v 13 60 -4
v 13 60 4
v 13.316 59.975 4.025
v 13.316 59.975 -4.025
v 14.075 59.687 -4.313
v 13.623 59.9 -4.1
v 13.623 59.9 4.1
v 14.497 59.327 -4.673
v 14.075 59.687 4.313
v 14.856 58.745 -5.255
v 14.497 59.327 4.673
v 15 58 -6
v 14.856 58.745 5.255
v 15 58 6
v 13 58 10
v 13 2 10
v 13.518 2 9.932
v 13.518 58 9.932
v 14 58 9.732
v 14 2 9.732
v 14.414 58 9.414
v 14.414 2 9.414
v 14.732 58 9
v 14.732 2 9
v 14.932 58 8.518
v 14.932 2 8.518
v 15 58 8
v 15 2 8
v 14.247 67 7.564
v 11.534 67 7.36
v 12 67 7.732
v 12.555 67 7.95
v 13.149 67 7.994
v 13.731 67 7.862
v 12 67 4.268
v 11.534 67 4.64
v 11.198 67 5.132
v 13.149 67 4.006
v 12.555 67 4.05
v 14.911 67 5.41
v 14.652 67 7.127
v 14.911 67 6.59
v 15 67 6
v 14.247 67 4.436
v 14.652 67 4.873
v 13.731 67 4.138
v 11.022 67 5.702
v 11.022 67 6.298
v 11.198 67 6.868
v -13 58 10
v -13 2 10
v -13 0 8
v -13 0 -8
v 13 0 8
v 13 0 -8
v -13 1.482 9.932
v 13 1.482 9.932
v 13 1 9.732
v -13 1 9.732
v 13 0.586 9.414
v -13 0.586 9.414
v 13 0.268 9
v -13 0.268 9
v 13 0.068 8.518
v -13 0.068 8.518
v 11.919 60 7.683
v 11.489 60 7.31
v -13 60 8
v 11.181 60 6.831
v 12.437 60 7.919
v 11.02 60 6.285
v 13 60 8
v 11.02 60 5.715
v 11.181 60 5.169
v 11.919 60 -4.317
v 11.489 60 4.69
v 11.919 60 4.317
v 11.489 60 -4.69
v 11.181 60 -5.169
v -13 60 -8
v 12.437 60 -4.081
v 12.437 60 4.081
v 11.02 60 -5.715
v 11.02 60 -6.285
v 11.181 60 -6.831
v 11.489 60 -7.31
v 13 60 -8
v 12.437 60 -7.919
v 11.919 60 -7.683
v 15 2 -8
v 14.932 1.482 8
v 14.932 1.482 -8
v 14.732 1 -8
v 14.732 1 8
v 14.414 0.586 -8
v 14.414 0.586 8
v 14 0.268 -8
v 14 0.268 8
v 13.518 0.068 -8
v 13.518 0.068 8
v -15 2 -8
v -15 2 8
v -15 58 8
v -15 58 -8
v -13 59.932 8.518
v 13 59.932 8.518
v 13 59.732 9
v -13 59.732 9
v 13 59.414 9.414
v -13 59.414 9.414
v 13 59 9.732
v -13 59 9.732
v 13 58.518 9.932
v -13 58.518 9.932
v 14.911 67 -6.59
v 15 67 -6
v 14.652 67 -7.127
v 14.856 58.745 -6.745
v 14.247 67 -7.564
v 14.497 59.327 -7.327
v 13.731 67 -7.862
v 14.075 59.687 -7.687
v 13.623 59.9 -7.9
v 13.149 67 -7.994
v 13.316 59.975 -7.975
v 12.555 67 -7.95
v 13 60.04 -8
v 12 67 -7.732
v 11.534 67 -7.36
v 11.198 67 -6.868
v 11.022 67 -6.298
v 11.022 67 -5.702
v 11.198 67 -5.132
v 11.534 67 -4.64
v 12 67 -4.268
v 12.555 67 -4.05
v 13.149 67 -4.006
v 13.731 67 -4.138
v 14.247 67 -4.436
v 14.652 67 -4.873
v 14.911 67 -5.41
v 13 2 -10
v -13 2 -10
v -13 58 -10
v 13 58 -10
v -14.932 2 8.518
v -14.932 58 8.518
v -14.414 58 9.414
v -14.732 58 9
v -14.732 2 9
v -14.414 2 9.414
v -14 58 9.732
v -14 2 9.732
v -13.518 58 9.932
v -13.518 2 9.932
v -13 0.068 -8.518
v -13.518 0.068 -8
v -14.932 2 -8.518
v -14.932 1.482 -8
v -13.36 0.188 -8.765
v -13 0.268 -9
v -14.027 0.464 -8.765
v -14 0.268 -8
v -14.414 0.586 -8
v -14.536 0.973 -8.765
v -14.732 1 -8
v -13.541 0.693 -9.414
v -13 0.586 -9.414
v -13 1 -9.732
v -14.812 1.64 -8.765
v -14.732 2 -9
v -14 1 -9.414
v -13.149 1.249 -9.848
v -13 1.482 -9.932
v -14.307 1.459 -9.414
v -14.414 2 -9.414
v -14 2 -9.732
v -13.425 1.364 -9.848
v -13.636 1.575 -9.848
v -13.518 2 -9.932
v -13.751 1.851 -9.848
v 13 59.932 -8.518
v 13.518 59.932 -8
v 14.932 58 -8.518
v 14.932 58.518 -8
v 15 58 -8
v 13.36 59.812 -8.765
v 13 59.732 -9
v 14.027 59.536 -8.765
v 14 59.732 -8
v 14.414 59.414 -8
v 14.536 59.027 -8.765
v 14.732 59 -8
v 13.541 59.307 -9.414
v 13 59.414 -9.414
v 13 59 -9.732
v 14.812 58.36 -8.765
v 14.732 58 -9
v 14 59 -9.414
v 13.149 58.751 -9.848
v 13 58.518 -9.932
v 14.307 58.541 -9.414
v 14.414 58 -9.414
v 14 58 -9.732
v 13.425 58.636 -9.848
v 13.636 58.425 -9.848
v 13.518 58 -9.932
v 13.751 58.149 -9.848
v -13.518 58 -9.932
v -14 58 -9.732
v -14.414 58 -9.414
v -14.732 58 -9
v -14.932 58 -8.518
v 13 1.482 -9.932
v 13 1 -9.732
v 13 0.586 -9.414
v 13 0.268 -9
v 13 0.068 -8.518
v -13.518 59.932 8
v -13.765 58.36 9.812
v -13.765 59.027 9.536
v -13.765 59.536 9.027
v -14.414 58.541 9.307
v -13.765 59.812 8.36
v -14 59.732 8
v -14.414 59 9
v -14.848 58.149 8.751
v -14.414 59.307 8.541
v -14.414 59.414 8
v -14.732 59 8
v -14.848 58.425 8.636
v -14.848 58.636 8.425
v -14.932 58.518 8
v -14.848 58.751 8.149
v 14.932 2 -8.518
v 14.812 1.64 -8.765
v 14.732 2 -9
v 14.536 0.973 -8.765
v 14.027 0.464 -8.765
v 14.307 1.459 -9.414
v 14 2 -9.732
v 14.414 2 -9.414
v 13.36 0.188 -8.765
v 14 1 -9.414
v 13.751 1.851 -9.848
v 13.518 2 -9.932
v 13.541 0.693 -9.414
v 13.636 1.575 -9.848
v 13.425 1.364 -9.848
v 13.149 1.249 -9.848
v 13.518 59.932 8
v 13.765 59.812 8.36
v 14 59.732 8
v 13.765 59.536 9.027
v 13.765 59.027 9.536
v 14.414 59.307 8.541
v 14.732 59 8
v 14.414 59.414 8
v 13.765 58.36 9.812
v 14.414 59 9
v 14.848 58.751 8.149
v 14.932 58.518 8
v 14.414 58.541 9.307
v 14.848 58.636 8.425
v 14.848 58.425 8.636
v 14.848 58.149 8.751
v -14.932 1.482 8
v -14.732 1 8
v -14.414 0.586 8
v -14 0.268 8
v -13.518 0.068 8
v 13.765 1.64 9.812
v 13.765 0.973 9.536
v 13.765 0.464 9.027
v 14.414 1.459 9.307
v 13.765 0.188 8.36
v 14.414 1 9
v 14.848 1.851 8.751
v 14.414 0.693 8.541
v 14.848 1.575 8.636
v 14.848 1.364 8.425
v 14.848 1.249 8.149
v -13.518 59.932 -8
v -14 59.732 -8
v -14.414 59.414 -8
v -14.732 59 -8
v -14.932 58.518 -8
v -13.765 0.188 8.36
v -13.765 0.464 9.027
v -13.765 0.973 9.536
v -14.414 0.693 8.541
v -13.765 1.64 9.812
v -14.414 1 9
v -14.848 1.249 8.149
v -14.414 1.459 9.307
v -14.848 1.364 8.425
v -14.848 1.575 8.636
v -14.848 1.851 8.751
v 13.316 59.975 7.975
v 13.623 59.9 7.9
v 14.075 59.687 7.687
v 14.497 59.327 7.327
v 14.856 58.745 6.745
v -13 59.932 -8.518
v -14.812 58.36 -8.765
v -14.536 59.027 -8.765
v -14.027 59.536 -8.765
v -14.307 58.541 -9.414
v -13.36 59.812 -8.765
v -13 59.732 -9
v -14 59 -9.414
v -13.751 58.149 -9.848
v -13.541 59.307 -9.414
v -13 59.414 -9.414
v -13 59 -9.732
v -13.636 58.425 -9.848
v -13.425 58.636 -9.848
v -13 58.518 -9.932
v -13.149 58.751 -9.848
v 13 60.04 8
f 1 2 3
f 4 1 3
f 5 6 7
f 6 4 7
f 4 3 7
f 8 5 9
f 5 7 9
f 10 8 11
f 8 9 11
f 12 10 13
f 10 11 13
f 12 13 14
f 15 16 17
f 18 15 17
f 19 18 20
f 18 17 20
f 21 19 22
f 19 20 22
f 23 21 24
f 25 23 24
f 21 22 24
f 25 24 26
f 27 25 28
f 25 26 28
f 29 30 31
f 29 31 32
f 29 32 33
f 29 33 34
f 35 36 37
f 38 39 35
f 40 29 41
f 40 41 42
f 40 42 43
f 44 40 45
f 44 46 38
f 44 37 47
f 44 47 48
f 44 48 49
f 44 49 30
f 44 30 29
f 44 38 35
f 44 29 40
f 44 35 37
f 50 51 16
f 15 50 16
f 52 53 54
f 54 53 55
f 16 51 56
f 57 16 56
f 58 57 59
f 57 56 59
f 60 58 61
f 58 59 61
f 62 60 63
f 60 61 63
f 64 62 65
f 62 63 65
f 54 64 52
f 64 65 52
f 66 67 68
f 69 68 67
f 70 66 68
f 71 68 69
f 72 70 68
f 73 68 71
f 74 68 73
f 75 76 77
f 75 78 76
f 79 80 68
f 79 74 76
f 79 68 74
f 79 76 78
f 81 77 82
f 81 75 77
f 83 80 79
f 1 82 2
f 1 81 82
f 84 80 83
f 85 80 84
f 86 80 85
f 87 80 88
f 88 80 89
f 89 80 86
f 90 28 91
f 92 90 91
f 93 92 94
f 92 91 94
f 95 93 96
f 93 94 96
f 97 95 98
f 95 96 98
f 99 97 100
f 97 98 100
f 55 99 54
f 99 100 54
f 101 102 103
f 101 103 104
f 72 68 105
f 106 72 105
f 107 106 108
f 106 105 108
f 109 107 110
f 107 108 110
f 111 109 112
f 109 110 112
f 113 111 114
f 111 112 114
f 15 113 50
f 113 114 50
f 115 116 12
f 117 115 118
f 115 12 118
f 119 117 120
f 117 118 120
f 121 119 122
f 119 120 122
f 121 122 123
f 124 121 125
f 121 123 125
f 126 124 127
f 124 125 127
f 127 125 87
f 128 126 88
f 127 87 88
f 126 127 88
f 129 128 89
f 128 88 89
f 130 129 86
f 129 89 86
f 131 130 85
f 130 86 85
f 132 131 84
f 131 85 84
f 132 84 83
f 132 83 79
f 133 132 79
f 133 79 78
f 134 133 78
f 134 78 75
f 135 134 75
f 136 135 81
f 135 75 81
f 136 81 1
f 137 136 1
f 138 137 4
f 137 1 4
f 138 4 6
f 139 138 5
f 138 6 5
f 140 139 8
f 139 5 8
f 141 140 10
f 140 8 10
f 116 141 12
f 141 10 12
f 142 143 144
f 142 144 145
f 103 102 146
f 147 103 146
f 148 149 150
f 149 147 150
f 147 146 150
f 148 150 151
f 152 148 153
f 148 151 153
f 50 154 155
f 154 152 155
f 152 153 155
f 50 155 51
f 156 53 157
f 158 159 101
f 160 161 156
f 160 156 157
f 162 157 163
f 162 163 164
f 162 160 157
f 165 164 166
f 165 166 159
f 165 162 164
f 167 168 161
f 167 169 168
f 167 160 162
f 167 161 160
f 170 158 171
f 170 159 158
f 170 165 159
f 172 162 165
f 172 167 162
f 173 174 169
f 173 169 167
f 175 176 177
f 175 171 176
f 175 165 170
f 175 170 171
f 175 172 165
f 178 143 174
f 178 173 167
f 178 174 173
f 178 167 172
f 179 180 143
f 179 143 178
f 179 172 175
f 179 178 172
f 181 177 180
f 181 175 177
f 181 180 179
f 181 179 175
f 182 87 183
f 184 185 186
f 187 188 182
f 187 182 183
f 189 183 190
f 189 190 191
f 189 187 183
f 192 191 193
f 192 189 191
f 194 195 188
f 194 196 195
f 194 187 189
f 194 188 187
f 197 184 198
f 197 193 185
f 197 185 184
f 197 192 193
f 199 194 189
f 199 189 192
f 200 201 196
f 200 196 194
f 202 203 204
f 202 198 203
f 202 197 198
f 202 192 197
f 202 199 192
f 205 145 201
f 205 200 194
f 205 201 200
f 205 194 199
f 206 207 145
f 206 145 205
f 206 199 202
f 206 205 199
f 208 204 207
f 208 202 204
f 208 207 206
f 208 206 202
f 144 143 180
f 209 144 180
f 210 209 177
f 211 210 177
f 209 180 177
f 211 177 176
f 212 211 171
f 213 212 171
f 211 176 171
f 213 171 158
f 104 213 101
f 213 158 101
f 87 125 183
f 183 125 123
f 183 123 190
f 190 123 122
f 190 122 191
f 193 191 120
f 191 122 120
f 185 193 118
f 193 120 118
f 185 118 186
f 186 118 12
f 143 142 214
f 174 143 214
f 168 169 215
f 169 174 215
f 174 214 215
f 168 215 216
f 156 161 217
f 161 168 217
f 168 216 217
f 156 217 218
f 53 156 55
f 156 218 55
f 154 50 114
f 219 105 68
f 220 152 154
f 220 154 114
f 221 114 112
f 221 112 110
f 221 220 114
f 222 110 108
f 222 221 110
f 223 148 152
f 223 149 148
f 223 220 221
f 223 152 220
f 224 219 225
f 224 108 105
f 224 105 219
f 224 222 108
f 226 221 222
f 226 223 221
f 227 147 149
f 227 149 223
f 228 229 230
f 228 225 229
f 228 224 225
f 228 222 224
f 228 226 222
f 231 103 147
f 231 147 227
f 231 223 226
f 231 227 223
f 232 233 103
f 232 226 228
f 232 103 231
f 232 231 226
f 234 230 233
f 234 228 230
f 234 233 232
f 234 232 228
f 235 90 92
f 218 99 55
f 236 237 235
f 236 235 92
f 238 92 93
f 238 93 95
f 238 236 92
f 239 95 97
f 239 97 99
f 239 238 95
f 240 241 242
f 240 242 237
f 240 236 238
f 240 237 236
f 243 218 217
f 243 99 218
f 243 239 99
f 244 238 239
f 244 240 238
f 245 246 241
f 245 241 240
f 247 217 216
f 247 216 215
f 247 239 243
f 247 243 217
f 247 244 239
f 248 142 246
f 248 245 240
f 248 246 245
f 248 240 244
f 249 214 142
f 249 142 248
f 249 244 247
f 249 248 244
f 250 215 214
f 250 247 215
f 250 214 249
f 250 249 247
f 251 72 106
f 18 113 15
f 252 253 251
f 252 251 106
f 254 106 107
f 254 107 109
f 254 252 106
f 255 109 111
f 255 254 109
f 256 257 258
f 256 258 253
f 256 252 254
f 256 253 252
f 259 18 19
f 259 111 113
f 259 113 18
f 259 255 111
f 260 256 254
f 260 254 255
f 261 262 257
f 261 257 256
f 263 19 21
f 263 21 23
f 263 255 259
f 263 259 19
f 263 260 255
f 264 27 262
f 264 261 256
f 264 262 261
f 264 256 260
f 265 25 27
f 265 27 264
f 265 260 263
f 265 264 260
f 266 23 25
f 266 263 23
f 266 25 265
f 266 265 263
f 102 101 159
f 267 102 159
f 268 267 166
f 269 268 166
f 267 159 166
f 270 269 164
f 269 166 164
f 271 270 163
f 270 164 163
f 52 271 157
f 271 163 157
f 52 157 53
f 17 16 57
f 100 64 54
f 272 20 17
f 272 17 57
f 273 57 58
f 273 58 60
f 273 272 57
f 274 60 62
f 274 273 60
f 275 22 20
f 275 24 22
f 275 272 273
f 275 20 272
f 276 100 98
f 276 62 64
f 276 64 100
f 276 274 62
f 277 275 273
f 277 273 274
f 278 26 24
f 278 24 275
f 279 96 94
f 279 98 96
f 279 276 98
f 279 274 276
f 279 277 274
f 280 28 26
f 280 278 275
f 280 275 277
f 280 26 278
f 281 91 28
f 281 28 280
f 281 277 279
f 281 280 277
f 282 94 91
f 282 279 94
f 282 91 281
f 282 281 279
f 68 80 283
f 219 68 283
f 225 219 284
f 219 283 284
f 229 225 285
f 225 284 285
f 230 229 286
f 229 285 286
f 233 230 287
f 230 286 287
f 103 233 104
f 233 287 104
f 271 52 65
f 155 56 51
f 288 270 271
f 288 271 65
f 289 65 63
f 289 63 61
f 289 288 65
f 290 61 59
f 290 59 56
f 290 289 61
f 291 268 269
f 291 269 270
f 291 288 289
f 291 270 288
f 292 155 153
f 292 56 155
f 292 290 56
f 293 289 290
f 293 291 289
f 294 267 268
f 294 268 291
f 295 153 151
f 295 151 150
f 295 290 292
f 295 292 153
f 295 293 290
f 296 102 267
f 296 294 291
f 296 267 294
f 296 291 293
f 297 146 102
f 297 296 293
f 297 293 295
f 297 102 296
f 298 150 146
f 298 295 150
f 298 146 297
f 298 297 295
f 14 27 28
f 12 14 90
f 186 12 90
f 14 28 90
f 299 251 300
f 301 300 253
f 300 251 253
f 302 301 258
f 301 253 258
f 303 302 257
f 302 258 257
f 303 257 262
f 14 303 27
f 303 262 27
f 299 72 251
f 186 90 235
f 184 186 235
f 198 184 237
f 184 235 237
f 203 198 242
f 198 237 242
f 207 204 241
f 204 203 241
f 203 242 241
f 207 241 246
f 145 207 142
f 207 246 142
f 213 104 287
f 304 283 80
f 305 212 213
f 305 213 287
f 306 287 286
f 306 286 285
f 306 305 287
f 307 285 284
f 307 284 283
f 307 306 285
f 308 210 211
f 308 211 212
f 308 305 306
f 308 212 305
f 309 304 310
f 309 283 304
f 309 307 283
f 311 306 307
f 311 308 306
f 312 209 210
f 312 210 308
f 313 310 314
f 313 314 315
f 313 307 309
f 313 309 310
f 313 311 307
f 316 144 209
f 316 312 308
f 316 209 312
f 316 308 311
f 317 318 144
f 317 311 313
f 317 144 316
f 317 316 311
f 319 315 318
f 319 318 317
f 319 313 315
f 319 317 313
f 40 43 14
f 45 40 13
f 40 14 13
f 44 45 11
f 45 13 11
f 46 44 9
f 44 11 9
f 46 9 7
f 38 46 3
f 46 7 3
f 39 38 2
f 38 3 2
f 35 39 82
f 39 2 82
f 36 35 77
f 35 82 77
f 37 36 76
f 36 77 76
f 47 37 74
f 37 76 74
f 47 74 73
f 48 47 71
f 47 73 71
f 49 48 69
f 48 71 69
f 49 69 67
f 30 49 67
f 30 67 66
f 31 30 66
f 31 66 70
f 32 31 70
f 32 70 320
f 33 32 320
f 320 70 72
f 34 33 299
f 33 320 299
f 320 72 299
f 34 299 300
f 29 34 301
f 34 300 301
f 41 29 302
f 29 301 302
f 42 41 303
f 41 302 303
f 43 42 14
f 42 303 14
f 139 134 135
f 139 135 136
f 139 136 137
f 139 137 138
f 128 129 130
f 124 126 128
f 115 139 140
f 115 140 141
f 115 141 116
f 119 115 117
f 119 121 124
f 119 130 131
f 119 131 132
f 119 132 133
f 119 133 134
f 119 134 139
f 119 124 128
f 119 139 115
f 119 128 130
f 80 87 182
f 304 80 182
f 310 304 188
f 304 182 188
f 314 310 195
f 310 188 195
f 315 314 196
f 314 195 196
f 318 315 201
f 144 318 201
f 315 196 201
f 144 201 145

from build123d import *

# Parameters (mm, degrees)
SKETCH1_W           = 30
SKETCH1_H           = 20
BOSS_EXTRUDE1_DEPTH = 60
SKETCH2_R           = 2
BOSS_EXTRUDE2_DEPTH = 7
FILLET1_R           = 2


with BuildPart() as part:
    # Sketch1 → Boss-Extrude1 (new body)
    with BuildSketch(Plane(origin=(0, 0, 0), x_dir=(1, 0, 0), z_dir=(0, 1, 0))):
        Rectangle(SKETCH1_W, SKETCH1_H)
    extrude(amount=BOSS_EXTRUDE1_DEPTH)

    # Sketch2 → Boss-Extrude2 (add)
    with BuildSketch(Plane(origin=(0, 60, 0), x_dir=(1, 0, 0), z_dir=(0, 1, 0))):
        with Locations((13, 6)):
            Circle(SKETCH2_R)
        with Locations((13, -6)):
            Circle(SKETCH2_R)
    extrude(amount=BOSS_EXTRUDE2_DEPTH)

    # Fillet1
    # the kernel refuses this fillet: 2 mm, written as the material it takes off along each edge
    with BuildSketch(Plane(origin=(13, 58, 8), x_dir=(0, 1, 0), z_dir=(1, 0, 0))) as fillet1_piece_1_section:
        Polygon((0, 0), (FILLET1_R * 1.02, 0), (FILLET1_R * 1.02, FILLET1_R * 1.02), (0, FILLET1_R * 1.02), align=None)
    fillet1_piece_1 = extrude(amount=FILLET1_R * 1.02, mode=Mode.PRIVATE)
    fillet1_piece_1 = fillet1_piece_1 - Plane(origin=(13, 58, 8), x_dir=(0, -0.7071067811865475, -0.7071067811865475), z_dir=(1, 0, 0)) * Sphere(FILLET1_R, mode=Mode.PRIVATE)
    add(fillet1_piece_1, mode=Mode.SUBTRACT)
    with BuildSketch(Plane(origin=(13, 58, -8), x_dir=(1, 0, 0), z_dir=(0, 0, -1))) as fillet1_piece_2_section:
        Polygon((0, 0), (FILLET1_R * 1.02, 0), (FILLET1_R * 1.02, -FILLET1_R * 1.02), (0, -FILLET1_R * 1.02), align=None)
    fillet1_piece_2 = extrude(amount=FILLET1_R * 1.02, mode=Mode.PRIVATE)
    fillet1_piece_2 = fillet1_piece_2 - Plane(origin=(13, 58, -8), x_dir=(-0.7071067811865475, -0.7071067811865475, 0), z_dir=(0, 0, -1)) * Sphere(FILLET1_R, mode=Mode.PRIVATE)
    add(fillet1_piece_2, mode=Mode.SUBTRACT)
    with BuildSketch(Plane(origin=(-13, 58, -8), x_dir=(-1, 0, 0), z_dir=(0, 0, -1))) as fillet1_piece_3_section:
        Polygon((0, 0), (FILLET1_R * 1.02, 0), (FILLET1_R * 1.02, FILLET1_R * 1.02), (0, FILLET1_R * 1.02), align=None)
    fillet1_piece_3 = extrude(amount=FILLET1_R * 1.02, mode=Mode.PRIVATE)
    fillet1_piece_3 = fillet1_piece_3 - Plane(origin=(-13, 58, -8), x_dir=(0.7071067811865475, -0.7071067811865475, 0), z_dir=(0, 0, -1)) * Sphere(FILLET1_R, mode=Mode.PRIVATE)
    add(fillet1_piece_3, mode=Mode.SUBTRACT)
    with BuildSketch(Plane(origin=(-13, 58, 8), x_dir=(0, 1, 0), z_dir=(-1, 0, 0))) as fillet1_piece_4_section:
        Polygon((0, 0), (FILLET1_R * 1.02, 0), (FILLET1_R * 1.02, -FILLET1_R * 1.02), (0, -FILLET1_R * 1.02), align=None)
    fillet1_piece_4 = extrude(amount=FILLET1_R * 1.02, mode=Mode.PRIVATE)
    fillet1_piece_4 = fillet1_piece_4 - Plane(origin=(-13, 58, 8), x_dir=(0, -0.7071067811865475, -0.7071067811865475), z_dir=(-1, 0, 0)) * Sphere(FILLET1_R, mode=Mode.PRIVATE)
    add(fillet1_piece_4, mode=Mode.SUBTRACT)
    with BuildSketch(Plane(origin=(13, 2, -8), x_dir=(1, 0, 0), z_dir=(0, 0, -1))) as fillet1_piece_5_section:
        Polygon((0, 0), (FILLET1_R * 1.02, 0), (FILLET1_R * 1.02, FILLET1_R * 1.02), (0, FILLET1_R * 1.02), align=None)
    fillet1_piece_5 = extrude(amount=FILLET1_R * 1.02, mode=Mode.PRIVATE)
    fillet1_piece_5 = fillet1_piece_5 - Plane(origin=(13, 2, -8), x_dir=(-0.7071067811865475, 0.7071067811865475, 0), z_dir=(0, 0, -1)) * Sphere(FILLET1_R, mode=Mode.PRIVATE)
    add(fillet1_piece_5, mode=Mode.SUBTRACT)
    with BuildSketch(Plane(origin=(-13, 2, -8), x_dir=(-1, 0, 0), z_dir=(0, 0, -1))) as fillet1_piece_6_section:
        Polygon((0, 0), (FILLET1_R * 1.02, 0), (FILLET1_R * 1.02, -FILLET1_R * 1.02), (0, -FILLET1_R * 1.02), align=None)
    fillet1_piece_6 = extrude(amount=FILLET1_R * 1.02, mode=Mode.PRIVATE)
    fillet1_piece_6 = fillet1_piece_6 - Plane(origin=(-13, 2, -8), x_dir=(0.7071067811865475, 0.7071067811865475, 0), z_dir=(0, 0, -1)) * Sphere(FILLET1_R, mode=Mode.PRIVATE)
    add(fillet1_piece_6, mode=Mode.SUBTRACT)
    with BuildSketch(Plane(origin=(13, 2, 8), x_dir=(0, -1, 0), z_dir=(1, 0, 0))) as fillet1_piece_7_section:
        Polygon((0, 0), (FILLET1_R * 1.02, 0), (FILLET1_R * 1.02, -FILLET1_R * 1.02), (0, -FILLET1_R * 1.02), align=None)
    fillet1_piece_7 = extrude(amount=FILLET1_R * 1.02, mode=Mode.PRIVATE)
    fillet1_piece_7 = fillet1_piece_7 - Plane(origin=(13, 2, 8), x_dir=(0, 0.7071067811865475, -0.7071067811865475), z_dir=(1, 0, 0)) * Sphere(FILLET1_R, mode=Mode.PRIVATE)
    add(fillet1_piece_7, mode=Mode.SUBTRACT)
    with BuildSketch(Plane(origin=(-13, 2, 8), x_dir=(0, -1, 0), z_dir=(-1, 0, 0))) as fillet1_piece_8_section:
        Polygon((0, 0), (FILLET1_R * 1.02, 0), (FILLET1_R * 1.02, FILLET1_R * 1.02), (0, FILLET1_R * 1.02), align=None)
    fillet1_piece_8 = extrude(amount=FILLET1_R * 1.02, mode=Mode.PRIVATE)
    fillet1_piece_8 = fillet1_piece_8 - Plane(origin=(-13, 2, 8), x_dir=(0, 0.7071067811865475, -0.7071067811865475), z_dir=(-1, 0, 0)) * Sphere(FILLET1_R, mode=Mode.PRIVATE)
    add(fillet1_piece_8, mode=Mode.SUBTRACT)
    with BuildSketch(Plane(origin=(15, 60, 8), x_dir=(0, -1, 0), z_dir=(0, 0, -1))) as fillet1_piece_9_section:
        with BuildLine():
            CenterArc((FILLET1_R, FILLET1_R), FILLET1_R, 180, 90)
            Line((0, FILLET1_R), (0, 0))
            Line((0, 0), (FILLET1_R, 0))
        make_face()
    fillet1_piece_9 = extrude(amount=2, mode=Mode.PRIVATE)
    fillet1_piece_9 = fillet1_piece_9 - Plane(origin=(13, 59.42884434, 6), x_dir=(1, 0, 0), z_dir=(0, -1, 0)) * Cylinder(2, 12, mode=Mode.PRIVATE)
    add(fillet1_piece_9, mode=Mode.SUBTRACT)
    with BuildSketch(Plane(origin=(15, 60, -6), x_dir=(0, -1, 0), z_dir=(0, 0, -1))) as fillet1_piece_10_section:
        with BuildLine():
            CenterArc((FILLET1_R, FILLET1_R), FILLET1_R, 180, 90)
            Line((0, FILLET1_R), (0, 0))
            Line((0, 0), (FILLET1_R, 0))
        make_face()
    fillet1_piece_10 = extrude(amount=2, mode=Mode.PRIVATE)
    fillet1_piece_10 = fillet1_piece_10 - Plane(origin=(13, 59.42884434, -6), x_dir=(1, 0, 0), z_dir=(0, -1, 0)) * Cylinder(2, 13, mode=Mode.PRIVATE)
    add(fillet1_piece_10, mode=Mode.SUBTRACT)
    with BuildSketch(Plane(origin=(13, 60, -10), x_dir=(0, -1, 0), z_dir=(-1, 0, 0)), Plane(origin=(-13, 0, 10), x_dir=(0, 0, -1), z_dir=(1, 0, 0))) as fillet1_piece_11:
        with BuildLine():
            CenterArc((FILLET1_R, FILLET1_R), FILLET1_R, 180, 90)
            Line((0, FILLET1_R), (0, 0))
            Line((0, 0), (FILLET1_R, 0))
        make_face()
    extrude(amount=26, mode=Mode.SUBTRACT)
    with BuildSketch(Plane(origin=(15, 60, 6), x_dir=(0, -1, 0), z_dir=(0, 0, -1))) as fillet1_piece_12_section:
        with BuildLine():
            CenterArc((FILLET1_R, FILLET1_R), FILLET1_R, 180, 90)
            Line((0, FILLET1_R), (0, 0))
            Line((0, 0), (FILLET1_R, 0))
        make_face()
    fillet1_piece_12 = extrude(amount=12, mode=Mode.PRIVATE)
    fillet1_piece_12 = fillet1_piece_12 - Plane(origin=(13, 59.530547013, 6), x_dir=(1, 0, 0), z_dir=(0, -1, 0)) * Cylinder(2, 32, mode=Mode.PRIVATE)
    fillet1_piece_12 = fillet1_piece_12 - Plane(origin=(13, 59.530547013, -6), x_dir=(1, 0, 0), z_dir=(0, -1, 0)) * Cylinder(2, 32, mode=Mode.PRIVATE)
    add(fillet1_piece_12, mode=Mode.SUBTRACT)
    with BuildSketch(Plane(origin=(-15, 60, -8), x_dir=(0, -1, 0), z_dir=(0, 0, 1))) as fillet1_piece_13:
        with BuildLine():
            CenterArc((FILLET1_R, FILLET1_R), FILLET1_R, 180, 90)
            Line((0, FILLET1_R), (0, 0))
            Line((0, 0), (FILLET1_R, 0))
        make_face()
    extrude(amount=16, mode=Mode.SUBTRACT)
    with BuildSketch(Plane(origin=(13, 0, -10), x_dir=(0, 1, 0), z_dir=(-1, 0, 0)), Plane(origin=(-13, 60, 10), x_dir=(0, 0, -1), z_dir=(1, 0, 0))) as fillet1_piece_14:
        with BuildLine():
            CenterArc((FILLET1_R, -FILLET1_R), FILLET1_R, 90, 90)
            Line((0, -FILLET1_R), (0, 0))
            Line((0, 0), (FILLET1_R, 0))
        make_face()
    extrude(amount=26, mode=Mode.SUBTRACT)
    with BuildSketch(Plane(origin=(15, 0, 8), x_dir=(0, 1, 0), z_dir=(0, 0, -1)), Plane(origin=(-15, 0, -8), x_dir=(0, 1, 0), z_dir=(0, 0, 1))) as fillet1_piece_15:
        with BuildLine():
            CenterArc((FILLET1_R, -FILLET1_R), FILLET1_R, 90, 90)
            Line((0, -FILLET1_R), (0, 0))
            Line((0, 0), (FILLET1_R, 0))
        make_face()
    extrude(amount=16, mode=Mode.SUBTRACT)
    with BuildSketch(Plane(origin=(-15, 2, -10), x_dir=(1, 0, 0), z_dir=(0, 1, 0)), Plane(origin=(-15, 2, 10), x_dir=(0, 0, -1), z_dir=(0, 1, 0))) as fillet1_piece_16:
        with BuildLine():
            CenterArc((FILLET1_R, -FILLET1_R), FILLET1_R, 90, 90)
            Line((0, -FILLET1_R), (0, 0))
            Line((0, 0), (FILLET1_R, 0))
        make_face()
    extrude(amount=56, mode=Mode.SUBTRACT)
    with BuildSketch(Plane(origin=(15, 2, -10), x_dir=(-1, 0, 0), z_dir=(0, 1, 0)), Plane(origin=(15, 2, 10), x_dir=(0, 0, -1), z_dir=(0, 1, 0))) as fillet1_piece_17:
        with BuildLine():
            CenterArc((FILLET1_R, FILLET1_R), FILLET1_R, 180, 90)
            Line((0, FILLET1_R), (0, 0))
            Line((0, 0), (FILLET1_R, 0))
        make_face()
    extrude(amount=56, mode=Mode.SUBTRACT)


solid = part.part
